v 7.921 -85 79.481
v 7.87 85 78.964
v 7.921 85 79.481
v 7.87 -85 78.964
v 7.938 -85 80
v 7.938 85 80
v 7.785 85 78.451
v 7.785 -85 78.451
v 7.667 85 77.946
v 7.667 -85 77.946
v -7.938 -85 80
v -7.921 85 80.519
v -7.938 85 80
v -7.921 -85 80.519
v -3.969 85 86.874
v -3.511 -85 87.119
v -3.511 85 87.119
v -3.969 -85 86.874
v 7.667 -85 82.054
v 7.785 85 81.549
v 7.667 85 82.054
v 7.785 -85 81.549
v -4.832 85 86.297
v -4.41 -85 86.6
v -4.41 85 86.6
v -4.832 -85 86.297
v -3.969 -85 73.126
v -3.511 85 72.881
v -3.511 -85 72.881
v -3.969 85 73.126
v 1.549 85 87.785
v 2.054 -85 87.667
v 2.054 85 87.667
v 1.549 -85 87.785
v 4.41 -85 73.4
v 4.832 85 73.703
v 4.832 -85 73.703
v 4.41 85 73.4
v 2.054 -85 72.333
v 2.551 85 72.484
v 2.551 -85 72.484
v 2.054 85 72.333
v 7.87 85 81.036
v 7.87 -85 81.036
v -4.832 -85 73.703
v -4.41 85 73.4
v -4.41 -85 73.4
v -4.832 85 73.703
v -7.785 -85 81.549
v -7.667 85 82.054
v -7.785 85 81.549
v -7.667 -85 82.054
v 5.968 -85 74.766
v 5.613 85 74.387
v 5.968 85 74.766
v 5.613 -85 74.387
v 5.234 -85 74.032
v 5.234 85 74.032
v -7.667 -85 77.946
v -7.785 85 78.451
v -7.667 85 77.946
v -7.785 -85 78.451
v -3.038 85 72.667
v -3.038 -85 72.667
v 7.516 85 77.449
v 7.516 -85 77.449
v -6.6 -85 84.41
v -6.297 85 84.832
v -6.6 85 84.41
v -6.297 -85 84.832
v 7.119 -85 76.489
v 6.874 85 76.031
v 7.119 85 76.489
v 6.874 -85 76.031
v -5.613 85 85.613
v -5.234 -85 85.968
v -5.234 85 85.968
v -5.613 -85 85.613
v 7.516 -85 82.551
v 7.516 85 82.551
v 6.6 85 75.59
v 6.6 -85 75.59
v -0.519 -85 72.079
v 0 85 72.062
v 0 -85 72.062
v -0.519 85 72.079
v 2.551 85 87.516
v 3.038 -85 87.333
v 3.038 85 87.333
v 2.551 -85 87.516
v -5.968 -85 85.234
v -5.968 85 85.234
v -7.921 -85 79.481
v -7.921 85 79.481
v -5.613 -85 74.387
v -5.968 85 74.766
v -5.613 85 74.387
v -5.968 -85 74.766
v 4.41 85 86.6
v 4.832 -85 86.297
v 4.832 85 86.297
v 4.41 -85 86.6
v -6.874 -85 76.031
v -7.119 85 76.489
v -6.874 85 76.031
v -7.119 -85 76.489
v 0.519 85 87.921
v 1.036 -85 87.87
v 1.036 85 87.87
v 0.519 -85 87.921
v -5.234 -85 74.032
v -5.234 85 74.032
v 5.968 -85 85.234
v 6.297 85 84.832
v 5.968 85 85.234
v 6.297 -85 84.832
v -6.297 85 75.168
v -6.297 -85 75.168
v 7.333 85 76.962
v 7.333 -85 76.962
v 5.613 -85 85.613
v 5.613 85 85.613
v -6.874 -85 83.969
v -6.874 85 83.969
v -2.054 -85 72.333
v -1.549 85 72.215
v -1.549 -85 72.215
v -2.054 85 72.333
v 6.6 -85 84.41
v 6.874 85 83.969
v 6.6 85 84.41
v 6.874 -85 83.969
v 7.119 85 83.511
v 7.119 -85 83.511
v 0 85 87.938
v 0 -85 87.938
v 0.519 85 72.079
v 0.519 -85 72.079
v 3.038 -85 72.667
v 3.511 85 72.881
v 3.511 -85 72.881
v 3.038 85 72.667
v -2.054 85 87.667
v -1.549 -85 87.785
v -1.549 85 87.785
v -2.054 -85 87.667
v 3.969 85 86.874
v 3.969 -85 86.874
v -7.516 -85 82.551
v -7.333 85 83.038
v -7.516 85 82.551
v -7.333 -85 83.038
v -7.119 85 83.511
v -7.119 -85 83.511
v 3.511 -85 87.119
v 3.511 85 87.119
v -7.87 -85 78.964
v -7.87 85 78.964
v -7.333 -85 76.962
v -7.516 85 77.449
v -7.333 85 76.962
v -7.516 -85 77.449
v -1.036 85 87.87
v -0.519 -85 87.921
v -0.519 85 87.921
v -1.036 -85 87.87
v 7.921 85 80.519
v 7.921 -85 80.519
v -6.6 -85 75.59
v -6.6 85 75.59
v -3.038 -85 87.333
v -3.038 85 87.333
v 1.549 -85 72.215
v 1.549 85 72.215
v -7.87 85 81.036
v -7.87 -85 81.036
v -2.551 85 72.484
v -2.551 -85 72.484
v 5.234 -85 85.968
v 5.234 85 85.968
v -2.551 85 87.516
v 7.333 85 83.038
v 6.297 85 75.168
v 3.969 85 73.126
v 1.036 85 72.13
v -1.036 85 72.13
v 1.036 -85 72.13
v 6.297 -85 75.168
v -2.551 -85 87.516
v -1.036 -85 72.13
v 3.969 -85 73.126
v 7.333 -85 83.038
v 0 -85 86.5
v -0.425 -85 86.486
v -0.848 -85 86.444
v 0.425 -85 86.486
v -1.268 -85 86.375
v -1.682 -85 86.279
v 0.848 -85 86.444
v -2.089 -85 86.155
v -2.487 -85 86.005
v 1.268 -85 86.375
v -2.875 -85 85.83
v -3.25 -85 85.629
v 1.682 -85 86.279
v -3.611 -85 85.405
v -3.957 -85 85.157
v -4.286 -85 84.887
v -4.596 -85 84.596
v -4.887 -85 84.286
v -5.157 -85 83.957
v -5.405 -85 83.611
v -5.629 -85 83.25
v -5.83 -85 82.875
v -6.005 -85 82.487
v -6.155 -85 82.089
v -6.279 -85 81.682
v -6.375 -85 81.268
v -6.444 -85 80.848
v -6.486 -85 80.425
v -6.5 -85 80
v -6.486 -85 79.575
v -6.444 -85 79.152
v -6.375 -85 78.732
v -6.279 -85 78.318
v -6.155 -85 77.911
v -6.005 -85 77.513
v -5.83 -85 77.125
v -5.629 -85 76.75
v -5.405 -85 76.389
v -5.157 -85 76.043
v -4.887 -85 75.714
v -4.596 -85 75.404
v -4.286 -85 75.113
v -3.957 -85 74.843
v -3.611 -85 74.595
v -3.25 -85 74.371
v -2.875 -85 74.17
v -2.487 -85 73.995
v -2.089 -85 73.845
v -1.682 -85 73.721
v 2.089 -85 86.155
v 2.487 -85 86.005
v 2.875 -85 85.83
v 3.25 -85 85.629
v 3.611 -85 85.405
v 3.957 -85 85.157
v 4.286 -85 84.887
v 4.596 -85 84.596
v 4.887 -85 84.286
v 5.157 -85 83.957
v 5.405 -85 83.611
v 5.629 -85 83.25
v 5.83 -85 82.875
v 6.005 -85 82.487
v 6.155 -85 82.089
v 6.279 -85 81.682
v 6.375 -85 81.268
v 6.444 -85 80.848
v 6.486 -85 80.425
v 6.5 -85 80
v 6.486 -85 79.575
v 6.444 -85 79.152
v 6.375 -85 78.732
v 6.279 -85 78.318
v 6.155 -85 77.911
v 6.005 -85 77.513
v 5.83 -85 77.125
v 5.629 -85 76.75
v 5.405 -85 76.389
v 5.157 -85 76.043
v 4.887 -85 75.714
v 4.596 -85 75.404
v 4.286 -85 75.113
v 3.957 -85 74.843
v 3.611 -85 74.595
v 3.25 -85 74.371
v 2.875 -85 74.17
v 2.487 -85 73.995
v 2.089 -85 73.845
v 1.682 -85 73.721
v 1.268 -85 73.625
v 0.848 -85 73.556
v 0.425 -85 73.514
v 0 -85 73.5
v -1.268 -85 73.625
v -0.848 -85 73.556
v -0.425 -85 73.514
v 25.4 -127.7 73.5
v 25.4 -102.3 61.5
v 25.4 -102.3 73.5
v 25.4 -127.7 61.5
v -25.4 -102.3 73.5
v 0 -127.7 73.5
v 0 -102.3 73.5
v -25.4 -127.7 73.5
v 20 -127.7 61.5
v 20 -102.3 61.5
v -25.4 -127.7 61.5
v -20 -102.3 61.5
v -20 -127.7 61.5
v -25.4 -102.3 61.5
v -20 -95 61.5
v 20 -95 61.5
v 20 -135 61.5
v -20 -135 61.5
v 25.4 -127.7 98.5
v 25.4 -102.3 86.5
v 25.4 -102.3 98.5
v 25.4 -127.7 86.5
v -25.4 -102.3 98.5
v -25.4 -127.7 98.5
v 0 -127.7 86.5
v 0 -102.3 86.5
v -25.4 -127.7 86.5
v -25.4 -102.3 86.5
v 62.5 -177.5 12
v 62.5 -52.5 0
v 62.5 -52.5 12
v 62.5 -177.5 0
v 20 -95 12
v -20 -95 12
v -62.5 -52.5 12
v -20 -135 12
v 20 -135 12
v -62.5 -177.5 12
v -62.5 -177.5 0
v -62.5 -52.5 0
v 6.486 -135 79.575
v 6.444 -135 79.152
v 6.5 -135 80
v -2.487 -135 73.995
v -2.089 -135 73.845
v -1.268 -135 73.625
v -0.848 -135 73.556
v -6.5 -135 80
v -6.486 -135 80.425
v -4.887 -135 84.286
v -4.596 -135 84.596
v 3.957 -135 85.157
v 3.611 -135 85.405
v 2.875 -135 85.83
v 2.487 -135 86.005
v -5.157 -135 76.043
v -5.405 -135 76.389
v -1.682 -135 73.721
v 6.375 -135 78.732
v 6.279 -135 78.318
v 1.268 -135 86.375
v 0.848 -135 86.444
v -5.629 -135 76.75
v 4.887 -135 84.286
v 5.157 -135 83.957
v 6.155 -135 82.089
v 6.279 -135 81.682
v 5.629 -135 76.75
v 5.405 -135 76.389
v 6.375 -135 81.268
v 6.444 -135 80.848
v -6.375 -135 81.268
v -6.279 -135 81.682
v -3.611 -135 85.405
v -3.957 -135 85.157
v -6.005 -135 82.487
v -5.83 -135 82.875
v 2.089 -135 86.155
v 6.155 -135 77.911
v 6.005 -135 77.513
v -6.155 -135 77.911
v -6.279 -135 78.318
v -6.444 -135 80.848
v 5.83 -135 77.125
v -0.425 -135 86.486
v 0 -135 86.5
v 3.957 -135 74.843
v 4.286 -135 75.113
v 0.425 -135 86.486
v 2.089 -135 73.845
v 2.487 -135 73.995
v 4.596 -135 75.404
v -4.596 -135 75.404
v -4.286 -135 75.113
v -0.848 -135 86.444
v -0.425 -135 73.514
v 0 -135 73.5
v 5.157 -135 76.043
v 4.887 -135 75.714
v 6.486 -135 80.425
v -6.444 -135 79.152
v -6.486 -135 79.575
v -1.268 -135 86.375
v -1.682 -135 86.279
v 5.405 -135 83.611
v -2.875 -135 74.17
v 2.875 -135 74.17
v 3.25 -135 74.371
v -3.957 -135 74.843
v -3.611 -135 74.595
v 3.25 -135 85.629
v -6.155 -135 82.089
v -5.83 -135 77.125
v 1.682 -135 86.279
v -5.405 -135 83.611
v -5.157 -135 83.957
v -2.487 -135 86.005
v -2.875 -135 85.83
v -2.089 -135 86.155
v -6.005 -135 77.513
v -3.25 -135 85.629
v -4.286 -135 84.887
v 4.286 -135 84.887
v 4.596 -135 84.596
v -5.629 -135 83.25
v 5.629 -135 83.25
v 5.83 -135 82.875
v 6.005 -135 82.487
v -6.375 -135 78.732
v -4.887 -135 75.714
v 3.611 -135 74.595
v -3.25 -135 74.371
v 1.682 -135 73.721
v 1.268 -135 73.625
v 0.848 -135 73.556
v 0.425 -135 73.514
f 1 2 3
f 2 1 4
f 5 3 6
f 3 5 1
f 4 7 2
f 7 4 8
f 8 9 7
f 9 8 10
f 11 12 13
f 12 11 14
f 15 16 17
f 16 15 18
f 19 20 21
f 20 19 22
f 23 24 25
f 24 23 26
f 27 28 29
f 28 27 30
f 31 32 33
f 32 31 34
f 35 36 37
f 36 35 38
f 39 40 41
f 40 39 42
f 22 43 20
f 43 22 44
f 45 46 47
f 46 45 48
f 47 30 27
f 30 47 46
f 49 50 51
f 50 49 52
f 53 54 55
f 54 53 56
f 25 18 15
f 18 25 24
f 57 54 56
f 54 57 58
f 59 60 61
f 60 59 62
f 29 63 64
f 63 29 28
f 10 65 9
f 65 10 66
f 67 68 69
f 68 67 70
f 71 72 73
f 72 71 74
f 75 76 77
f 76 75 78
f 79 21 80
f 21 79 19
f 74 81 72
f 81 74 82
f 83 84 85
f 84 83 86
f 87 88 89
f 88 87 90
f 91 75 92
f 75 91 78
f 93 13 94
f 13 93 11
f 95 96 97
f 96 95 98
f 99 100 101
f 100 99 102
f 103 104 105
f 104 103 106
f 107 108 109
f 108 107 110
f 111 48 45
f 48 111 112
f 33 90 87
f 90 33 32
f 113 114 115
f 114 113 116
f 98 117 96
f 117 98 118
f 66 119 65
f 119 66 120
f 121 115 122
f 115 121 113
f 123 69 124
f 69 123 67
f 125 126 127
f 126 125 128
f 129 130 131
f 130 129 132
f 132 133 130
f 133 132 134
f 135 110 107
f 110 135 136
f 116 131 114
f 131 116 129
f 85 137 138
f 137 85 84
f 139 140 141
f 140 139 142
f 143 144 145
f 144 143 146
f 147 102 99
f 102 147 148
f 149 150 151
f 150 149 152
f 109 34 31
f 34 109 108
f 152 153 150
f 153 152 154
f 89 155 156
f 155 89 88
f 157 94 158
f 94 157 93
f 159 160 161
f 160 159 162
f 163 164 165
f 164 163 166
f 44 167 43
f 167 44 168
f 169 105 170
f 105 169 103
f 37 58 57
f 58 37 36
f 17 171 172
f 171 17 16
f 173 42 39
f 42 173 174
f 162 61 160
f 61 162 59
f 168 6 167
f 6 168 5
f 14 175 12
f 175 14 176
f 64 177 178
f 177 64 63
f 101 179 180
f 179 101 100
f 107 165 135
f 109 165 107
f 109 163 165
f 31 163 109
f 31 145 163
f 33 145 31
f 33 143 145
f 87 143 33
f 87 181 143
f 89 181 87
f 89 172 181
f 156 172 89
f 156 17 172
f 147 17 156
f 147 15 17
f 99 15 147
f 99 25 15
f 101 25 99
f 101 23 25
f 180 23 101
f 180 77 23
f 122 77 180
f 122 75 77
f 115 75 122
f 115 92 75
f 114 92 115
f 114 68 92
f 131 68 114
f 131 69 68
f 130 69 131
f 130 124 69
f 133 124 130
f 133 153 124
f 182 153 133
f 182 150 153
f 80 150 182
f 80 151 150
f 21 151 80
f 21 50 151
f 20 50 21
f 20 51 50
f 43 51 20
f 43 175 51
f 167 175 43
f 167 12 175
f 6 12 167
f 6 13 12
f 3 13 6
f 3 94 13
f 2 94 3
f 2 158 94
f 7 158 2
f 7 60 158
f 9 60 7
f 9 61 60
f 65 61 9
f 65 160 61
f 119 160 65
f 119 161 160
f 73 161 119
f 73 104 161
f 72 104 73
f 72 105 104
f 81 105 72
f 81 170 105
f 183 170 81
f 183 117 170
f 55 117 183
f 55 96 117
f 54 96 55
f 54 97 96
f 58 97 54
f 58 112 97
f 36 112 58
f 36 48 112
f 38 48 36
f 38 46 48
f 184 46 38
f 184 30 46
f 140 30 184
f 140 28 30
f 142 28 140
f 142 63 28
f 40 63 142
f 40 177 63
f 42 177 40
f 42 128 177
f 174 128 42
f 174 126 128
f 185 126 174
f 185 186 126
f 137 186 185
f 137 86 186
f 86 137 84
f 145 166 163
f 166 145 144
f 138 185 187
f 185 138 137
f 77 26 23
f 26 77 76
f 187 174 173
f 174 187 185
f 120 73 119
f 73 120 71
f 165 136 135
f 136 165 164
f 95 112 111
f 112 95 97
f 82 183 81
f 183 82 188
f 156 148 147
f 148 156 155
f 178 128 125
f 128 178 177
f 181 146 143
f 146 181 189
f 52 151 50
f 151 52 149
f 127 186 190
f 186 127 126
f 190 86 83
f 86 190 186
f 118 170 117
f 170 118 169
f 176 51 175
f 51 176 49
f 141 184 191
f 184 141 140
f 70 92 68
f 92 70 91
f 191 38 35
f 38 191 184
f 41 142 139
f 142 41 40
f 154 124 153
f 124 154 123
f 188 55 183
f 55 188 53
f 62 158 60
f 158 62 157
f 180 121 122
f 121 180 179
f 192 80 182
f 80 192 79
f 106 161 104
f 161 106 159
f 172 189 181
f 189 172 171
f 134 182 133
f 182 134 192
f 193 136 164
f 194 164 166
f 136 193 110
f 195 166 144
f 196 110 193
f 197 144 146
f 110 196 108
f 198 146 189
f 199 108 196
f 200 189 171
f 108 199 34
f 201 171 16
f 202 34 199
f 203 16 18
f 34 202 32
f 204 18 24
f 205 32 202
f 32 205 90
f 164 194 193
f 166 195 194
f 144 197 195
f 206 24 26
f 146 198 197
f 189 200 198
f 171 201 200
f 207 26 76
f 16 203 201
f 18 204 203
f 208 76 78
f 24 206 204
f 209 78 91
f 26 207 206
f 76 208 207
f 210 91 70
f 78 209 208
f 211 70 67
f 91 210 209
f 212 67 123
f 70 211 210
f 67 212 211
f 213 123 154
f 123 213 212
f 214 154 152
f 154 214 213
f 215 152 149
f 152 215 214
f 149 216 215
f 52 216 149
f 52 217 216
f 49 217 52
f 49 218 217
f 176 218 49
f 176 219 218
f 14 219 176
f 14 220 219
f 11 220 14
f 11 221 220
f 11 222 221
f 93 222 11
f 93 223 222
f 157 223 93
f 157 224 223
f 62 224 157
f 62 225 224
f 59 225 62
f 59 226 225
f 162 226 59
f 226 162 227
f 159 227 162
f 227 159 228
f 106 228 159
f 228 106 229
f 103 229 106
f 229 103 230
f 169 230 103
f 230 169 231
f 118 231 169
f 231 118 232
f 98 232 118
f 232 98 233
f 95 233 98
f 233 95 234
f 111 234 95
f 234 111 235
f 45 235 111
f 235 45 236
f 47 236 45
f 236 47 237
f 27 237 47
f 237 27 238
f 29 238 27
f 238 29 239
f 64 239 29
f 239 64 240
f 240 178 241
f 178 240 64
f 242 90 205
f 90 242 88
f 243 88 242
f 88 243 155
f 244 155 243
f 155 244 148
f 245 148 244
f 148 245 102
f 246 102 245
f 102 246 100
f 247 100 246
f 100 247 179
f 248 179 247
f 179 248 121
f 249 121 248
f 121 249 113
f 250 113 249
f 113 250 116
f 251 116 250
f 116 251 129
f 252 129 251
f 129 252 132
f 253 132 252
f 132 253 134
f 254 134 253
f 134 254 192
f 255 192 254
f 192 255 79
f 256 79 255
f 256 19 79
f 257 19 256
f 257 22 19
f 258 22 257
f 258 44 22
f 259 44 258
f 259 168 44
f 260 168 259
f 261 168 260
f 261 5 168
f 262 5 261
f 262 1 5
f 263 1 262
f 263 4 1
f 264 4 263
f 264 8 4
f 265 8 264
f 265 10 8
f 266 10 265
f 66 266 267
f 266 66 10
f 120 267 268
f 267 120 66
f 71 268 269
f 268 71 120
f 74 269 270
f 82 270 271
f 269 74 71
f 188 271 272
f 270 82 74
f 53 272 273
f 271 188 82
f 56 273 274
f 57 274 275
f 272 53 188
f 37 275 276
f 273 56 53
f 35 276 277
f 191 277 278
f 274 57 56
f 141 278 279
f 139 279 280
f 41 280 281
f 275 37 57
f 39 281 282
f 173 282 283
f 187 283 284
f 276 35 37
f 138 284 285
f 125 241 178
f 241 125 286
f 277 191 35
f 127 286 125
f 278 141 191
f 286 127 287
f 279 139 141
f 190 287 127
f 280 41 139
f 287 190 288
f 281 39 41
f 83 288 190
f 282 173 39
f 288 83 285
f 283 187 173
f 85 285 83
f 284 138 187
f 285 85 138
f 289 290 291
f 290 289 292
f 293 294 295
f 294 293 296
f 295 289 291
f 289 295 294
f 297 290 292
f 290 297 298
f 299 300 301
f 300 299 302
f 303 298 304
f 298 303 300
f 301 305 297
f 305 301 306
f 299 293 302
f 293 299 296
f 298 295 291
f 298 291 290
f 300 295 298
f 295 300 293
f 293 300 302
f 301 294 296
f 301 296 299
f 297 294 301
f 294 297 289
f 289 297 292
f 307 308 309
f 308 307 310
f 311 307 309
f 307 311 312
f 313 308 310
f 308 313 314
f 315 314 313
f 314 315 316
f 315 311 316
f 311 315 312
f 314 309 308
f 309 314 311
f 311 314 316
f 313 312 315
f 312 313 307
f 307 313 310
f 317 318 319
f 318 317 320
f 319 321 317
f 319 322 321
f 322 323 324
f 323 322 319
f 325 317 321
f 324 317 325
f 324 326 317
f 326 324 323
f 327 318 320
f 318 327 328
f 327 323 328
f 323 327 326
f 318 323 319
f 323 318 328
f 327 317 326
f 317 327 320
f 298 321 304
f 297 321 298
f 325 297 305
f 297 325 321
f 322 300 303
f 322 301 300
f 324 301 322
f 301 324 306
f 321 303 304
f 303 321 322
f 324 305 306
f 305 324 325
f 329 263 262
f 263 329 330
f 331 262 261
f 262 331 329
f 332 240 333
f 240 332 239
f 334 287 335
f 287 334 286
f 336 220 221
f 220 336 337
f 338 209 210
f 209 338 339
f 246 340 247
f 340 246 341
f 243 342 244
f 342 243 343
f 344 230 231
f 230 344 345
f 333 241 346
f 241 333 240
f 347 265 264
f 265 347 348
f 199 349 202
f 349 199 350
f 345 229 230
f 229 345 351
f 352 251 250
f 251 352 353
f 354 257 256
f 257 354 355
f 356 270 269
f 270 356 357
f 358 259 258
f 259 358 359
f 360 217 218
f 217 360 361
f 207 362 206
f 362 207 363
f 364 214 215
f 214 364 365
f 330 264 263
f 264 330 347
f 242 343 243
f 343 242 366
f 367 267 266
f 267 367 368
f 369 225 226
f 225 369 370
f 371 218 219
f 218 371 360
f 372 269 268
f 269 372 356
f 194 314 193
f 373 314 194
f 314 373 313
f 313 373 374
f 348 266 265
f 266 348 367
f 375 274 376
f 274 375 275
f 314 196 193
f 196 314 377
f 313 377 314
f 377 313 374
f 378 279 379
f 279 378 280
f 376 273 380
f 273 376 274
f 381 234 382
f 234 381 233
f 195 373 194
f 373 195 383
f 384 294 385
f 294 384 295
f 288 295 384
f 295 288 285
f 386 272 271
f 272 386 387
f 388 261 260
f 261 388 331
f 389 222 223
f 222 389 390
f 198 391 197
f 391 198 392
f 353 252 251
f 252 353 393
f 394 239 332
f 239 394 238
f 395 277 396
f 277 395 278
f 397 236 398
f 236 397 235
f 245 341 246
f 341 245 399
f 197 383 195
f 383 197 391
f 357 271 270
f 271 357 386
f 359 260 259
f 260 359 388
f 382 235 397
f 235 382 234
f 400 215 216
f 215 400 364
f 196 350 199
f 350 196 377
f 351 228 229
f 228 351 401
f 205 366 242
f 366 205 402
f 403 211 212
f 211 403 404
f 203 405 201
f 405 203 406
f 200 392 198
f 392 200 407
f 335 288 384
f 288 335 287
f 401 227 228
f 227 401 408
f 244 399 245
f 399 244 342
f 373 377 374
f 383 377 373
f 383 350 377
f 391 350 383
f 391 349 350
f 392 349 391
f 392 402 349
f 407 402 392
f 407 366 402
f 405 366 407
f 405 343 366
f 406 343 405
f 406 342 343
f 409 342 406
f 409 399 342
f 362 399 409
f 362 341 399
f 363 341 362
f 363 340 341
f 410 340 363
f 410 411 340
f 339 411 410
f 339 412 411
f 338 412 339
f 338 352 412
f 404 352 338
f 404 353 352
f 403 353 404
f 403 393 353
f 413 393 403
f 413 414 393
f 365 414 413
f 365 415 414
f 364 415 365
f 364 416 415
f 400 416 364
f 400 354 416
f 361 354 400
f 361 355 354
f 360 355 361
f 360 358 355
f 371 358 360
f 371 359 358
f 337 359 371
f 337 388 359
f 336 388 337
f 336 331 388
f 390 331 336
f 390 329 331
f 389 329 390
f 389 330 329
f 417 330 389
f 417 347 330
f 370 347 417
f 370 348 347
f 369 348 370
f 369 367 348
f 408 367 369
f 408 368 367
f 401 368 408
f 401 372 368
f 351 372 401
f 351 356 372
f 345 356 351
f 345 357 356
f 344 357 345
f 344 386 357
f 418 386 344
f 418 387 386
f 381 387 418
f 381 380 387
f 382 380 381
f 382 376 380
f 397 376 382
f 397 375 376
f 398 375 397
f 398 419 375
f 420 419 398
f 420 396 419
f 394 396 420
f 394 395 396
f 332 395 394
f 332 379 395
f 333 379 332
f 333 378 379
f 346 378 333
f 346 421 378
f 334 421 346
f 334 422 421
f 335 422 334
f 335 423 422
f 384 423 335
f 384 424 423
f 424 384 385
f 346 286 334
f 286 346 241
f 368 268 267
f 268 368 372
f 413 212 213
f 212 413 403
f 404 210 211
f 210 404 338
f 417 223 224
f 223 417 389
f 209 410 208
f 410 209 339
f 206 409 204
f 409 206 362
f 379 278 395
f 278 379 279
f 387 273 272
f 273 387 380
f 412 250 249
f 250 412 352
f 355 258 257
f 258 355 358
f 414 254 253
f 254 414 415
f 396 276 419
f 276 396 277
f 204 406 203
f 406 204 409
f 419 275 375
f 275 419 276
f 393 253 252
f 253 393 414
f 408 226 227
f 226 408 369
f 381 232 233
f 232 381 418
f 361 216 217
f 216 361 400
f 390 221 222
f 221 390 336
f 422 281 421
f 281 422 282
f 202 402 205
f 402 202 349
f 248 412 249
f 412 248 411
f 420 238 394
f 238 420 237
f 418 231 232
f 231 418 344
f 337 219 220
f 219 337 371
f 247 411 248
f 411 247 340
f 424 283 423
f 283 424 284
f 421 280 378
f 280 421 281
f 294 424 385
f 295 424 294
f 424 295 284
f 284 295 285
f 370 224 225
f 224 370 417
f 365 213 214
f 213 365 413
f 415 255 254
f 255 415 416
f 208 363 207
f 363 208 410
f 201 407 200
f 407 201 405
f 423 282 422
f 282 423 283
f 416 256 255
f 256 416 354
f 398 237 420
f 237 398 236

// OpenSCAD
// mm. Real-trial bench drawing for the core-withdrawal task. Axis y is the core axis; z is up; bench top z=0.
// Bought parts are drawn as envelopes only (steel-jaw vise drawn as a 25.4 x 50.8 mm jaw-contact envelope).
// part = "assembled" | "core" | "wall" | "jaw_gauge"
$fn=96;
part="assembled";
core_d=13.0; core_l=220; exposed=50;           // 304 stainless rod, ends chamfered 0.5 x 45 deg
wall_id=12.7; wall_od=15.875; wall_l=170;      // NewAge Silcon 1/2" x 5/8" Shore A50 tube, cut square
axis_z=80;                                    // core axis height above the bench
jaw_y=-115; jaw_w=25.4; jaw_h=50.8; jaw_t=12;  // jaw centre on the core axis frame (y), jaw size
core_y=-25;                                    // core centre; wall centre at y=0, far ends flush at y=+85
module core(){translate([0,core_y-core_l/2,axis_z])rotate([-90,0,0])cylinder(d=core_d,h=core_l);}
module wall(){translate([0,-wall_l/2,axis_z])rotate([-90,0,0])difference(){cylinder(d=wall_od,h=wall_l);translate([0,0,-1])cylinder(d=wall_id,h=wall_l+2);}}
module jaws(){
  translate([-jaw_h/2,jaw_y-jaw_w/2,axis_z-core_d/2-jaw_t])cube([jaw_h,jaw_w,jaw_t]);
  translate([-jaw_h/2,jaw_y-jaw_w/2,axis_z+core_d/2])cube([jaw_h,jaw_w,jaw_t]);
  translate([-62.5,jaw_y-62.5,0])cube([125,125,12]);
  translate([-20,jaw_y-20,12])cube([40,40,axis_z-core_d/2-jaw_t-12]);
}
// Reset gauge: a 3 mm plate with a 50.0 mm slot spanning rear core end y=-135 to wall start y=-85.
// It does NOT measure from a jaw face: the forward jaw edge is y=-102.3, 17.3 mm behind the wall start.
module jaw_gauge(){difference(){cube([60,20,3]);translate([5,5,-1])cube([exposed,10,5]);}}
if(part=="assembled"){color("silver")core();color("pink")wall();color("dimgray")jaws();}
if(part=="core")core();
if(part=="wall")wall();
if(part=="jaw_gauge")jaw_gauge();
